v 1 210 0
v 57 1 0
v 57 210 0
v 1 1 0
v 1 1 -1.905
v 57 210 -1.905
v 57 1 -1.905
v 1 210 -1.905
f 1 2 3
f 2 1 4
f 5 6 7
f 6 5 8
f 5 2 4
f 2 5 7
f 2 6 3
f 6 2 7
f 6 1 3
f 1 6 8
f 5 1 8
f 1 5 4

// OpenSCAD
module simpleplaywood(length=57, width = 210, spacing = 0.5, playwood_thickness = 0.75 * 2.54, c = [0.80,0.43,0.32]) 
{
    translate([length/2+spacing,width/2+spacing,-playwood_thickness/2])
    color(c)
    cube([length-2*spacing, width-2*spacing, playwood_thickness],center=true);
    
 
}

simpleplaywood();
